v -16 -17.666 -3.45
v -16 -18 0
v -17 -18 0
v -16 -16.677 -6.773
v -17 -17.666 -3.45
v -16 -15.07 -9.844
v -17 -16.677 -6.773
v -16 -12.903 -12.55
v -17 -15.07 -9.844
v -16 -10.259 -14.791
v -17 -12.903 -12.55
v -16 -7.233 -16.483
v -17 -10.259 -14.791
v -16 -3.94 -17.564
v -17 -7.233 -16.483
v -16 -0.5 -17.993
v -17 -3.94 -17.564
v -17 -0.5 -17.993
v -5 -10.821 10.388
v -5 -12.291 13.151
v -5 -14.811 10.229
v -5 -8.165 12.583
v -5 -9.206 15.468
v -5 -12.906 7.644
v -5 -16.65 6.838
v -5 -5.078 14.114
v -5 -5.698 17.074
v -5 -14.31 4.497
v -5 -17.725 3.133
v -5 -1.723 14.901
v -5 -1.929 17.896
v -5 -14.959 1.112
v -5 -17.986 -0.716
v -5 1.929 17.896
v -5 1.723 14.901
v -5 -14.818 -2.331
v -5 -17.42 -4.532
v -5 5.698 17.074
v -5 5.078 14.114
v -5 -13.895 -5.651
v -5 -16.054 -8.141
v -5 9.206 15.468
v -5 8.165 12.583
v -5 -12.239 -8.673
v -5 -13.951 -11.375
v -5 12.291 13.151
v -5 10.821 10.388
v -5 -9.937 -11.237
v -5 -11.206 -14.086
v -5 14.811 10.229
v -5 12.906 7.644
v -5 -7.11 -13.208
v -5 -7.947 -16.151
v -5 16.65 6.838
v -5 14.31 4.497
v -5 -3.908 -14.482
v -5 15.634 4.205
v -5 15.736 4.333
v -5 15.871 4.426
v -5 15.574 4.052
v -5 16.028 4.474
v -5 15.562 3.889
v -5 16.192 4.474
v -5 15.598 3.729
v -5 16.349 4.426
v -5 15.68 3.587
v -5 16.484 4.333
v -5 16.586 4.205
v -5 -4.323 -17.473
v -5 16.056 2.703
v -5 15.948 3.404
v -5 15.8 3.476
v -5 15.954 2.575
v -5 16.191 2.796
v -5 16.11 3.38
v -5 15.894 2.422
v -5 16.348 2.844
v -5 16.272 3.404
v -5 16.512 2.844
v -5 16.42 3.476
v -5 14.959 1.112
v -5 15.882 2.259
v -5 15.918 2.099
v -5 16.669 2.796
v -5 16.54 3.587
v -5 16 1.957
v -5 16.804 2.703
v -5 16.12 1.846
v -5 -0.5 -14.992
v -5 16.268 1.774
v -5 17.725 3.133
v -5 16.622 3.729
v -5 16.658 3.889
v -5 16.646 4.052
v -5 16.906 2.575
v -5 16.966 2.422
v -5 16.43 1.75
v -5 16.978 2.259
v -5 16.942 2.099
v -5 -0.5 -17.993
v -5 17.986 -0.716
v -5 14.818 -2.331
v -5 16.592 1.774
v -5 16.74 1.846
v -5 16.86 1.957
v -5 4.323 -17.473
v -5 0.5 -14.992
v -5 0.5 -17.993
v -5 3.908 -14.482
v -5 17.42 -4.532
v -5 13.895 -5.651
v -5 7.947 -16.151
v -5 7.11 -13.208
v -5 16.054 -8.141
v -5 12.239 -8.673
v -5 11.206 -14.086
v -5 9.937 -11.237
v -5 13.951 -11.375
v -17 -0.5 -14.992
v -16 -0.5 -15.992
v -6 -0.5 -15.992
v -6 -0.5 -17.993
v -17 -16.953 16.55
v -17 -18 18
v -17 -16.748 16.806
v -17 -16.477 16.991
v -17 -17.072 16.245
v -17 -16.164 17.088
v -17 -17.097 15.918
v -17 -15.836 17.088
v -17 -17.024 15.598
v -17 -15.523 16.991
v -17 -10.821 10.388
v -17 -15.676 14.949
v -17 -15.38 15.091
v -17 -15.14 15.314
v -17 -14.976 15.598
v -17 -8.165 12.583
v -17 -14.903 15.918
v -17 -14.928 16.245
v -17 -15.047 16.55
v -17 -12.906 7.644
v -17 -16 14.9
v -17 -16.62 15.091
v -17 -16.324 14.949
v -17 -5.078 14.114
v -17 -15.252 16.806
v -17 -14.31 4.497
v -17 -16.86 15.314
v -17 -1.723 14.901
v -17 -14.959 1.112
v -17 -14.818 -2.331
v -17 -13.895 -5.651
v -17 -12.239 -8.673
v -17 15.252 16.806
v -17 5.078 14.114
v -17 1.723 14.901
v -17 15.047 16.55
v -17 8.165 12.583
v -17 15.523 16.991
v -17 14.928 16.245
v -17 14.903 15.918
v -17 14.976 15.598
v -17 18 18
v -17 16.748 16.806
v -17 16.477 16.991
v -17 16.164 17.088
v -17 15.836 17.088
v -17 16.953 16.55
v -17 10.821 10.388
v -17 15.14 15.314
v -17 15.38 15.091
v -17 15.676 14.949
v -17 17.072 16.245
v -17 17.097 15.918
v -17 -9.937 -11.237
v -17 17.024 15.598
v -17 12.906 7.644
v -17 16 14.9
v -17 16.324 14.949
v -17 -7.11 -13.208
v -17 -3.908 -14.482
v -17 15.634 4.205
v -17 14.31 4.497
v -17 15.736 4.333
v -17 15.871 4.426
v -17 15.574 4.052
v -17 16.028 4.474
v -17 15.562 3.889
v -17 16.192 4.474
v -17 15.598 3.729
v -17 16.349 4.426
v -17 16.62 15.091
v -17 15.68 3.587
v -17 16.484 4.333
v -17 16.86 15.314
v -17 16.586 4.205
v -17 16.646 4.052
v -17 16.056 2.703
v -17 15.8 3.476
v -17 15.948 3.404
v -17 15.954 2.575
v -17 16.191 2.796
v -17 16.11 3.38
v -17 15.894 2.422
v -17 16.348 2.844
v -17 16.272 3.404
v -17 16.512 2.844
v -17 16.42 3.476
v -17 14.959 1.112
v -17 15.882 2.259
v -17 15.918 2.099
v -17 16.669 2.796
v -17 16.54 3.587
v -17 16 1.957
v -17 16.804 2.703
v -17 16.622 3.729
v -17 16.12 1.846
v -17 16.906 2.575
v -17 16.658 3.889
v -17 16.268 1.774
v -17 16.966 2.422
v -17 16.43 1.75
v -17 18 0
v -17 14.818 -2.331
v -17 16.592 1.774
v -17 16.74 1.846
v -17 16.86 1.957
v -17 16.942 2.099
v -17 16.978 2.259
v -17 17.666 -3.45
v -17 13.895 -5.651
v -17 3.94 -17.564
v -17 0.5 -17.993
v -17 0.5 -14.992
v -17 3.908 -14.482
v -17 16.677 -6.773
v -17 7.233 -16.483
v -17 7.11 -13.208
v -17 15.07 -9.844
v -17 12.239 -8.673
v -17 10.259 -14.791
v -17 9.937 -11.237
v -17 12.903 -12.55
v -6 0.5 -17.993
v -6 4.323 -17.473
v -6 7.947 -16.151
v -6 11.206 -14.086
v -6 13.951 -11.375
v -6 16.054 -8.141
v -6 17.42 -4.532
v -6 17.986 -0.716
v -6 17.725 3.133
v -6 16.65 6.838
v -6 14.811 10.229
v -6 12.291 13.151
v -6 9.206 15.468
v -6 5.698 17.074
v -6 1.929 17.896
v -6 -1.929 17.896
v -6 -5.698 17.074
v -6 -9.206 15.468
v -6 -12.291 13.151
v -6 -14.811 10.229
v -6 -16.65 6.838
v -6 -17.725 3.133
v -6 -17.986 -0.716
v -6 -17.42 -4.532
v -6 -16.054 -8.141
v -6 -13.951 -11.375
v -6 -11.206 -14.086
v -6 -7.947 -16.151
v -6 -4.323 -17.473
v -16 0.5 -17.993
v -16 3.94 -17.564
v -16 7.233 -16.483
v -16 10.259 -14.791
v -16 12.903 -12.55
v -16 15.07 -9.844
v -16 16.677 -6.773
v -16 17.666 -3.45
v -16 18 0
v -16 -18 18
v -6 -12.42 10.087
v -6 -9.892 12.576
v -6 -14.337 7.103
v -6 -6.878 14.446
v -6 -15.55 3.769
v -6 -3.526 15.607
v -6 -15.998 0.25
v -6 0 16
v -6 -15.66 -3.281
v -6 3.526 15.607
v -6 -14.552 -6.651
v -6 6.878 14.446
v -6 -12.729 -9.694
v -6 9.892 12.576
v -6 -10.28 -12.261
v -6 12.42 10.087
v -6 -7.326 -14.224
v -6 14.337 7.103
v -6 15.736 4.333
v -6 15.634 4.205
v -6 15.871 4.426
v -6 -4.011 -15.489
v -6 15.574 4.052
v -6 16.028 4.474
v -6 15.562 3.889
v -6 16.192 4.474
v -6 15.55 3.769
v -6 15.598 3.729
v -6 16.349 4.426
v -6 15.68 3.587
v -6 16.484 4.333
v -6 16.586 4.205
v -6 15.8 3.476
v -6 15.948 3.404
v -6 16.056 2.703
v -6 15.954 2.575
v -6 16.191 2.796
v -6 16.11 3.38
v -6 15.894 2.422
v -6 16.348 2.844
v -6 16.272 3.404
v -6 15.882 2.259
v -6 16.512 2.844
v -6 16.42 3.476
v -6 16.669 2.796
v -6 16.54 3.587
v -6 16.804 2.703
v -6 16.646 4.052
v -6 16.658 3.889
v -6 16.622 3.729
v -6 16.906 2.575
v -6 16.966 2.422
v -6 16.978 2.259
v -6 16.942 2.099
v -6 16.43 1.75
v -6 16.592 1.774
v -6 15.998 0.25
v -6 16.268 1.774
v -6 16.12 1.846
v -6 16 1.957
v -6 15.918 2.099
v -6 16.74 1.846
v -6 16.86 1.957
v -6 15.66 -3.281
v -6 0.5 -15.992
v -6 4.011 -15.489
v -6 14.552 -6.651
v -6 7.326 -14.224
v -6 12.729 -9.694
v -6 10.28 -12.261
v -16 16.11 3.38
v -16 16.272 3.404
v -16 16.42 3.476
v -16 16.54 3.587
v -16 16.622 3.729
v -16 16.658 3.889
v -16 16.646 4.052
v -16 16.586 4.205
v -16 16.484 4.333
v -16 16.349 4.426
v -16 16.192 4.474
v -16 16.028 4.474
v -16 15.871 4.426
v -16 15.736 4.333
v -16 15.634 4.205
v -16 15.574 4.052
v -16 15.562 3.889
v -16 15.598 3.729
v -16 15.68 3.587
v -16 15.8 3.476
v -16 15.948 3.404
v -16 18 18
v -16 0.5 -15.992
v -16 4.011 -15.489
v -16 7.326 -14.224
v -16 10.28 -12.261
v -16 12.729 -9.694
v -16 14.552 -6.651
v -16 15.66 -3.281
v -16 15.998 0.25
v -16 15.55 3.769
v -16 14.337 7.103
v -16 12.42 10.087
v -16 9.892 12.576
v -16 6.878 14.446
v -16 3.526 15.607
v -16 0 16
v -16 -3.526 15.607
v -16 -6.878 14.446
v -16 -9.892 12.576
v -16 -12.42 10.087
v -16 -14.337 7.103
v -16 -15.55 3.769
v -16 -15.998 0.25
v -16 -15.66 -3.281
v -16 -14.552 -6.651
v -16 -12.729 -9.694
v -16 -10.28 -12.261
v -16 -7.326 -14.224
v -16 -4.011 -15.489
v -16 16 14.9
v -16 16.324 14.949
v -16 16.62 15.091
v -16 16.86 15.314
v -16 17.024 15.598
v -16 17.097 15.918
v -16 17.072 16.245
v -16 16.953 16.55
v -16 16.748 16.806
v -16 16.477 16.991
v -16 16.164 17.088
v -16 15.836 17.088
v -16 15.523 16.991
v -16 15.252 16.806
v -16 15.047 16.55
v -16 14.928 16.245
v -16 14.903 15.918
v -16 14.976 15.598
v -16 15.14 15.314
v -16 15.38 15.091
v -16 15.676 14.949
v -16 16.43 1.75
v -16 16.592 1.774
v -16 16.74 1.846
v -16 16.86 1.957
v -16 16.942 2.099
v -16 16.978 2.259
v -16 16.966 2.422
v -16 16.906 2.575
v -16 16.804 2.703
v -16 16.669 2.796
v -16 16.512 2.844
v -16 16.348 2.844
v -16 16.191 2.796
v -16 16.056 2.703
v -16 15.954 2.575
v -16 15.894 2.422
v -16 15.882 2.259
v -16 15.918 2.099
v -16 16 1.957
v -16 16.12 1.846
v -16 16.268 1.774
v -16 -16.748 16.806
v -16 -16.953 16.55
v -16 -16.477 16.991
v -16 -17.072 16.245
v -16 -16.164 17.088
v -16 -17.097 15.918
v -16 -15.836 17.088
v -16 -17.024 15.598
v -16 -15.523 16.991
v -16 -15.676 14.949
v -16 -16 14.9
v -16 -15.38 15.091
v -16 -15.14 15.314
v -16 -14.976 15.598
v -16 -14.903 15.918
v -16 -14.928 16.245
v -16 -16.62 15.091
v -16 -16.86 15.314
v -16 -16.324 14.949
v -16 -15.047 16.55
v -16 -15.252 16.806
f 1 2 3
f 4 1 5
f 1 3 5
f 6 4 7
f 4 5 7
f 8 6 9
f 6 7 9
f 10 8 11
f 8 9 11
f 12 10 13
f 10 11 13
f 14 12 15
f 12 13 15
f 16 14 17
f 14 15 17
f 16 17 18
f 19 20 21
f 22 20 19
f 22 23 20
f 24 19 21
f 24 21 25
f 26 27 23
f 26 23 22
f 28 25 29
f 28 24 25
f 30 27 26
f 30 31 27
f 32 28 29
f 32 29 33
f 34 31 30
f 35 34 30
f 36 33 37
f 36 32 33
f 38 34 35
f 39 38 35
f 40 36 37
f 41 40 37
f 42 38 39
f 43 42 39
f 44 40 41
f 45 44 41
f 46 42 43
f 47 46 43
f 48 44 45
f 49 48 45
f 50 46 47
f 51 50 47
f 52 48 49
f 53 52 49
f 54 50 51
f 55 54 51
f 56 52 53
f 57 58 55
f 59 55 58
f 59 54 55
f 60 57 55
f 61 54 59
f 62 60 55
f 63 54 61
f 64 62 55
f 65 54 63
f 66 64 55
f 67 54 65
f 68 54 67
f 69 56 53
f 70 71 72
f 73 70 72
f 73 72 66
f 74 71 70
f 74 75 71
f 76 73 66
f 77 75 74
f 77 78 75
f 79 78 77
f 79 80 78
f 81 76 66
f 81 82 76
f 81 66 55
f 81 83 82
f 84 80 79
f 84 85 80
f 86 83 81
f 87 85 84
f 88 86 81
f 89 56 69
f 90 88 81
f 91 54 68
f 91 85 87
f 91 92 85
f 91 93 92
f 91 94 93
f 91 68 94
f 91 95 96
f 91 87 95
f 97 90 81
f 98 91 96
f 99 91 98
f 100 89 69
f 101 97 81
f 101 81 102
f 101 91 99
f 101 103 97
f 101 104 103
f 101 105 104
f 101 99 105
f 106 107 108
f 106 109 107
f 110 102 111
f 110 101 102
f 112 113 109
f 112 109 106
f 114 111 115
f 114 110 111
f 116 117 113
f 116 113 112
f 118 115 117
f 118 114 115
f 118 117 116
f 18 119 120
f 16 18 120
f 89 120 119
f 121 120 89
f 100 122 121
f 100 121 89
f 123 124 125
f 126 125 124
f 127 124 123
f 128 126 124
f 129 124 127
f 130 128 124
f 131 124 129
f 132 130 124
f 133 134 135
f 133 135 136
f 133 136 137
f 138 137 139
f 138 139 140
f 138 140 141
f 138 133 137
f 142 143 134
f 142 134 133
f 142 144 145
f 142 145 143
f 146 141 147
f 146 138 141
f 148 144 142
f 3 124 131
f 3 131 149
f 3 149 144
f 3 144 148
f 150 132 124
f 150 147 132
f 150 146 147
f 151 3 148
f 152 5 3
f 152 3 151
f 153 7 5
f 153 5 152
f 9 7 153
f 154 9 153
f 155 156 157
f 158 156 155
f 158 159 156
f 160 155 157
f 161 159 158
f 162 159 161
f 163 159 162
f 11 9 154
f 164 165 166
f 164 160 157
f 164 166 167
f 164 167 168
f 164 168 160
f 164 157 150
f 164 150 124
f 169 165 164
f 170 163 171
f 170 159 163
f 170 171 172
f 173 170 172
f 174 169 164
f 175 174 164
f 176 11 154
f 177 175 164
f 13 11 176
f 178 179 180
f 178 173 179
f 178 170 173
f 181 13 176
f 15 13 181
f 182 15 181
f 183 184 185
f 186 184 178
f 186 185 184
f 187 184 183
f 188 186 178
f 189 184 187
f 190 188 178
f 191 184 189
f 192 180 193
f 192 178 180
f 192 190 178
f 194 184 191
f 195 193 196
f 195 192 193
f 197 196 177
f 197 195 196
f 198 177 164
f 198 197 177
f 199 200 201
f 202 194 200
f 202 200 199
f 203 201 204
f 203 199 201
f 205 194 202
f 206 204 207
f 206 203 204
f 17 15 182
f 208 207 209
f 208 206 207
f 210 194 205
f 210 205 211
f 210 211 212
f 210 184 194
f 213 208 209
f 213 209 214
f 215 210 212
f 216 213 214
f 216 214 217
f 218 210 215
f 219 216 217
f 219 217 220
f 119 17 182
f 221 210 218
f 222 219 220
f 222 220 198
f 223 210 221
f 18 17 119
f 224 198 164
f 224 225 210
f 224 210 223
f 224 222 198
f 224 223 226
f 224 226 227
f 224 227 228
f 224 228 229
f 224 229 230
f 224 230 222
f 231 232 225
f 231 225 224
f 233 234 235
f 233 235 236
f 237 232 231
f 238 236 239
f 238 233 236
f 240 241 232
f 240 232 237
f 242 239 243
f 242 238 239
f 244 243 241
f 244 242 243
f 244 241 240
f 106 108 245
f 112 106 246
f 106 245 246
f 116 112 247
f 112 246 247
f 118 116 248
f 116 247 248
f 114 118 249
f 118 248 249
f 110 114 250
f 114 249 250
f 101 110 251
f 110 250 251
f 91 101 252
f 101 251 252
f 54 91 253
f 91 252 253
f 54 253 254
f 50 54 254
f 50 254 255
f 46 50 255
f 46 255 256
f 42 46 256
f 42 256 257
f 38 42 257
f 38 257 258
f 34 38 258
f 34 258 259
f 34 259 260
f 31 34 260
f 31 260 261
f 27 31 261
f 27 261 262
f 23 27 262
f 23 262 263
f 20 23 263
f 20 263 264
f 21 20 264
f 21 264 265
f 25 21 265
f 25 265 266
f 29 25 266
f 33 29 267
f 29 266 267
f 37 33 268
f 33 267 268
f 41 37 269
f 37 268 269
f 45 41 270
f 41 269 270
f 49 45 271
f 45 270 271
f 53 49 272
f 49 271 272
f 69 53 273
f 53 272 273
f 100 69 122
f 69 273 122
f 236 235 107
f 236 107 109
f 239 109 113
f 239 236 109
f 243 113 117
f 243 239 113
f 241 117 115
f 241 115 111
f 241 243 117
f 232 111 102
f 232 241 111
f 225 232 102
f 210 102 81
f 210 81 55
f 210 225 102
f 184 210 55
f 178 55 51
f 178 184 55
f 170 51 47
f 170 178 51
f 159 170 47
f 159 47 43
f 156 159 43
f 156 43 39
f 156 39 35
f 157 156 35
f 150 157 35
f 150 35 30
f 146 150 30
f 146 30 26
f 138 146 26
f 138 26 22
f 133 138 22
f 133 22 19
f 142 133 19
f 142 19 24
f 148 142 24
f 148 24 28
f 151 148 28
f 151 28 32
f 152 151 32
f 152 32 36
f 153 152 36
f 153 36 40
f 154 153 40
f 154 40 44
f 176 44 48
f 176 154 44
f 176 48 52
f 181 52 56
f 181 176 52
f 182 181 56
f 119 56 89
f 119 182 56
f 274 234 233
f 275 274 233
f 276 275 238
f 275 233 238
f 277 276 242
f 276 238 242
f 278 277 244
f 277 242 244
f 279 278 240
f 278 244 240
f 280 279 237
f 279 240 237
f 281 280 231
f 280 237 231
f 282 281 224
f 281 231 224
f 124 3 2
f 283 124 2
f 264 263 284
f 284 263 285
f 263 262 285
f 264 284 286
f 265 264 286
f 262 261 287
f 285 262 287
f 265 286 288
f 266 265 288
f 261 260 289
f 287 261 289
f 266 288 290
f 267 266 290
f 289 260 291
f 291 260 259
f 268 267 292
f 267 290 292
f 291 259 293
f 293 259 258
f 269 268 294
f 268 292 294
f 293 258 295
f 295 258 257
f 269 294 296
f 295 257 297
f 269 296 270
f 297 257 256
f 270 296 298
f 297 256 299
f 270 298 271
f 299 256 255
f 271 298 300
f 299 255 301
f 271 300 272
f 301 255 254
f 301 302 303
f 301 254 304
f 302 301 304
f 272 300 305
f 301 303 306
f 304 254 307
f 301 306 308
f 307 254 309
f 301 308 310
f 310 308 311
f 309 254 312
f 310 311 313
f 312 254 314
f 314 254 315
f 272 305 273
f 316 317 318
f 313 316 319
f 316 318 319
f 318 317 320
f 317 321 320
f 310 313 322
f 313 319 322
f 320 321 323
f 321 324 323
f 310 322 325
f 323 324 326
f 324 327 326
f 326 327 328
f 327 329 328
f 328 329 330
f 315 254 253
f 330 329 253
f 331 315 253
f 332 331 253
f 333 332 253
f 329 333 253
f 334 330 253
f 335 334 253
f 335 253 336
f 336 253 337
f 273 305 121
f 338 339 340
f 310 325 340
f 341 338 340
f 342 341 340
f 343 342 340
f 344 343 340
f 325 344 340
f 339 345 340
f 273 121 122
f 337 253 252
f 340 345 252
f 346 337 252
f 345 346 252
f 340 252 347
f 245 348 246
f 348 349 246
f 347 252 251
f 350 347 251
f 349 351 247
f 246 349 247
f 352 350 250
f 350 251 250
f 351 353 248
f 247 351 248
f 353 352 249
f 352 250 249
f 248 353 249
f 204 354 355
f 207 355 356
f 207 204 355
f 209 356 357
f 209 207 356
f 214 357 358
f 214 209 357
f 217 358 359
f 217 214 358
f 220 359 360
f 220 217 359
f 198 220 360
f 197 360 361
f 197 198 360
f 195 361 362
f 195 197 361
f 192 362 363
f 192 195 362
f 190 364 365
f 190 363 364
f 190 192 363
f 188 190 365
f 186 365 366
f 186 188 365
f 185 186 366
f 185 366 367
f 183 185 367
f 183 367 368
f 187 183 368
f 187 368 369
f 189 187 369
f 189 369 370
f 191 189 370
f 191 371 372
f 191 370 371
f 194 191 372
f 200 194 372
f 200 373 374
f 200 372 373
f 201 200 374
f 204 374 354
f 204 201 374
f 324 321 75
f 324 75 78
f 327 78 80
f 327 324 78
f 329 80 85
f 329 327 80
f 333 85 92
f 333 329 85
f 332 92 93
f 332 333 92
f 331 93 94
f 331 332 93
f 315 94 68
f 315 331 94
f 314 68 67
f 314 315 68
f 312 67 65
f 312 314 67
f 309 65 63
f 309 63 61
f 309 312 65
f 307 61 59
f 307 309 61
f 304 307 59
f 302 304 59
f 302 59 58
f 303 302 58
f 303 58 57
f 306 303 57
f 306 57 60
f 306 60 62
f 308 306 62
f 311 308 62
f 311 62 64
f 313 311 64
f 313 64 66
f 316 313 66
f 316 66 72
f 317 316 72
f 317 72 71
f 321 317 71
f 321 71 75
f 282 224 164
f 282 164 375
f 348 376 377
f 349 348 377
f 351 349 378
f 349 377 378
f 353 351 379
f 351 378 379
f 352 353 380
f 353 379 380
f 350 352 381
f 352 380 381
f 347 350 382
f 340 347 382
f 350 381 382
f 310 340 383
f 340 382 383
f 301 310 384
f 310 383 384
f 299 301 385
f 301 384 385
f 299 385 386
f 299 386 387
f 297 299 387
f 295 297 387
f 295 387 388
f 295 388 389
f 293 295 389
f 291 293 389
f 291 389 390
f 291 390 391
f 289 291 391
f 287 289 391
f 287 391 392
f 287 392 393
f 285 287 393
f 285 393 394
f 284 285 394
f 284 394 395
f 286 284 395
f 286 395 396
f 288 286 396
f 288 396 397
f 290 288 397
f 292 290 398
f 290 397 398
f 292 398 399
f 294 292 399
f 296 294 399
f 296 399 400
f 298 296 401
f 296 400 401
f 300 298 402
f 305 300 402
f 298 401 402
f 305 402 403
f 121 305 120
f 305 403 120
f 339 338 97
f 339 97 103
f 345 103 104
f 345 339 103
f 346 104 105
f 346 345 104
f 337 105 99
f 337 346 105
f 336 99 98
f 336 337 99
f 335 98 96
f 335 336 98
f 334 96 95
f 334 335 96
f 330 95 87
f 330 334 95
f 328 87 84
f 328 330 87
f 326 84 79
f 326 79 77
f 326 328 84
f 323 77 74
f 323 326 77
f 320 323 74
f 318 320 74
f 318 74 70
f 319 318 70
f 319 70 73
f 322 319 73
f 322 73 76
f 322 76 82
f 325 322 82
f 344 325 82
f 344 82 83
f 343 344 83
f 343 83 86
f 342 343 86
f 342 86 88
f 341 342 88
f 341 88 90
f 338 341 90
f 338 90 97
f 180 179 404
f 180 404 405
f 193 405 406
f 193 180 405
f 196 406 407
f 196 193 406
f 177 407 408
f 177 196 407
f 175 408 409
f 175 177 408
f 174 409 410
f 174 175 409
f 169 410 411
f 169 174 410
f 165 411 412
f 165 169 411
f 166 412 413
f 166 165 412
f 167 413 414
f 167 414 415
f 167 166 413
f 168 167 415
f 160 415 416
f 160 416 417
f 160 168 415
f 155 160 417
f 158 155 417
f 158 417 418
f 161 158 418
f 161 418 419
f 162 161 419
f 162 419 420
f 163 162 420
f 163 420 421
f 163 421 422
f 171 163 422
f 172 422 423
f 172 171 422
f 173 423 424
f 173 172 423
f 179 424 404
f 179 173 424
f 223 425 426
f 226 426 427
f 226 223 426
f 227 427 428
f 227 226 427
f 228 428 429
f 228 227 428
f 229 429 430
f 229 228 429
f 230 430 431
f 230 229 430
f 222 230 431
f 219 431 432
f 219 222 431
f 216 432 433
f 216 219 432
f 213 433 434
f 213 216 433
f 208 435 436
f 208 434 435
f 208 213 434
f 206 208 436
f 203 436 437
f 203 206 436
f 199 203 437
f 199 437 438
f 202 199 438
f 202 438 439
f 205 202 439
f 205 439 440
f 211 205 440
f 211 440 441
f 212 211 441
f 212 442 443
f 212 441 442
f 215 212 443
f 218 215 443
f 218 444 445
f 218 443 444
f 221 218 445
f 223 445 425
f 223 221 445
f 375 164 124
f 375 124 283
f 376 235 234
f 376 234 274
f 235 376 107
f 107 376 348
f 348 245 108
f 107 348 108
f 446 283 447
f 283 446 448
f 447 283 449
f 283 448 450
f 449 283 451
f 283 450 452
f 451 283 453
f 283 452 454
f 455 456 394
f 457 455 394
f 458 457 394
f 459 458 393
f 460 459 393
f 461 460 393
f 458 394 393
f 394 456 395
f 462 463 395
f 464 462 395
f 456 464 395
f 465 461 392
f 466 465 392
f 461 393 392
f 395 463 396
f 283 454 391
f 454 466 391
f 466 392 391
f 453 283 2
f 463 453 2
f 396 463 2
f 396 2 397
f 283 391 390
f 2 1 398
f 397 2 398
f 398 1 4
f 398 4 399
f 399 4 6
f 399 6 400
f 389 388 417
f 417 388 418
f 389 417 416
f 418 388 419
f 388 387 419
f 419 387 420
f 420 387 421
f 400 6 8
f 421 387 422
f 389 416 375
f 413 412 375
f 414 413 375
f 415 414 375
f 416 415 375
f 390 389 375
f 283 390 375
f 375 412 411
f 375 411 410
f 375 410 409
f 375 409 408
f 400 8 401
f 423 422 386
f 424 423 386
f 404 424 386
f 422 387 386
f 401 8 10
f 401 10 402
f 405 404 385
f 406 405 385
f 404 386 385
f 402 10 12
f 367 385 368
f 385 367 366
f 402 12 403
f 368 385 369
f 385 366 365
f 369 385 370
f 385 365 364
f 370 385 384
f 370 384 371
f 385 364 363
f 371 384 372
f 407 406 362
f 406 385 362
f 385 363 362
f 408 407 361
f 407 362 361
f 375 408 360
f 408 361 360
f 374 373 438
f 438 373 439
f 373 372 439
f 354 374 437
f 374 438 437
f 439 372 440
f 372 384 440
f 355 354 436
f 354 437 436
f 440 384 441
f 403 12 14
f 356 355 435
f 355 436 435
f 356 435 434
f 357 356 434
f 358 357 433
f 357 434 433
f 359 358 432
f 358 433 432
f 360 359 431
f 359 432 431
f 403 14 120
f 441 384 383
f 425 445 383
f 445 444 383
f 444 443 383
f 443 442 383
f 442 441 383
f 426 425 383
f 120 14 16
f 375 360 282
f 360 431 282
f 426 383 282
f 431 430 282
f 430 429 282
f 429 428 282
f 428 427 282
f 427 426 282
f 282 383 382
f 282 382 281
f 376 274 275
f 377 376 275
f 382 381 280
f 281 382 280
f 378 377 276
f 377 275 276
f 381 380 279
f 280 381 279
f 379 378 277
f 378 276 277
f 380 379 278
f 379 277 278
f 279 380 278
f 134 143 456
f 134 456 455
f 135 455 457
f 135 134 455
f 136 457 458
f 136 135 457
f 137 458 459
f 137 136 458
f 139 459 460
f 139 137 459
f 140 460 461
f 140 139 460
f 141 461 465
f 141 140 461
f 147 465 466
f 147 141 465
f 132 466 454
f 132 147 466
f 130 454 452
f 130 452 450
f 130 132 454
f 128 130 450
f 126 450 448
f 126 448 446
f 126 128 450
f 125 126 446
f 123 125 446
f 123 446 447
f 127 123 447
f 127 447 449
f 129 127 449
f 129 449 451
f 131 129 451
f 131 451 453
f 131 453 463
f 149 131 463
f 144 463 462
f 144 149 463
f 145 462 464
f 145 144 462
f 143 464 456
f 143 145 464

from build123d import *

# Parameters (mm, degrees)
CYLINDER079_R     = 0.55
CYLINDER079_DEPTH = 12
CYLINDER078_R     = 0.55
CYLINDER078_DEPTH = 12
CYLINDER073_R     = 15
CYLINDER073_DEPTH = 12
CYLINDER072_R     = 1.1
CYLINDER072_DEPTH = 1
CYLINDER071_R     = 1.1
CYLINDER071_DEPTH = 1
BOX039_W          = 1
BOX039_H          = 36
BOX039_DEPTH      = 18
CYLINDER075_R     = 0.55
CYLINDER075_DEPTH = 12
CYLINDER074_R     = 0.55
CYLINDER074_DEPTH = 12
BOX038_W          = 12
BOX038_H          = 1
BOX038_DEPTH      = 5
CYLINDER069_R     = 16
CYLINDER069_DEPTH = 10
CYLINDER068_R     = 18
CYLINDER068_DEPTH = 10
CYLINDER067_R     = 15
CYLINDER067_DEPTH = 12
CYLINDER066_R     = 18
CYLINDER066_DEPTH = 12


with BuildPart() as zylinder076:
    # Cylinder079 → Cylinder079 (new body)
    with BuildSketch(Plane(origin=(-17, 16.11, 3.93), x_dir=(0, 0, -1), z_dir=(1, 0, 0))):
        Circle(CYLINDER079_R)
    extrude(amount=CYLINDER079_DEPTH)


with BuildPart() as fusion037:
    # Cylinder078 → Cylinder078 (new body)
    with BuildSketch(Plane(origin=(-17, 16.43, 2.3), x_dir=(0, 0, -1), z_dir=(1, 0, 0))):
        Circle(CYLINDER078_R)
    extrude(amount=CYLINDER078_DEPTH)

    # Fusion037: union Zylinder076
    add(zylinder076.part)


with BuildPart() as zylinder070:
    # Cylinder073 → Cylinder073 (new body)
    with BuildSketch(Plane(origin=(-17, 0, 0), x_dir=(0, 0, -1), z_dir=(1, 0, 0))):
        Circle(CYLINDER073_R)
    extrude(amount=CYLINDER073_DEPTH)


with BuildPart() as zylinder069:
    # Cylinder072 → Cylinder072 (new body)
    with BuildSketch(Plane(origin=(-17, 16, 16), x_dir=(0, 0, -1), z_dir=(1, 0, 0))):
        Circle(CYLINDER072_R)
    extrude(amount=CYLINDER072_DEPTH)


with BuildPart() as fusion034:
    # Cylinder071 → Cylinder071 (new body)
    with BuildSketch(Plane(origin=(-17, -16, 16), x_dir=(0, 0, -1), z_dir=(1, 0, 0))):
        Circle(CYLINDER071_R)
    extrude(amount=CYLINDER071_DEPTH)

    # Fusion034: union Zylinder069
    add(zylinder069.part)


with BuildPart() as cut059:
    # Box039 → Box039 (new body)
    with BuildSketch(Plane(origin=(-17, -18, 0), x_dir=(1, 0, 0), z_dir=(0, 0, 1))):
        with Locations((0.5, 18)):
            Rectangle(BOX039_W, BOX039_H)
    extrude(amount=BOX039_DEPTH)

    # Cut055: cut Fusion034
    add(fusion034.part, mode=Mode.SUBTRACT)

    # Cut056: cut Zylinder070
    add(zylinder070.part, mode=Mode.SUBTRACT)

    # Cut059: cut Fusion037
    add(fusion037.part, mode=Mode.SUBTRACT)


with BuildPart() as zylinder072:
    # Cylinder075 → Cylinder075 (new body)
    with BuildSketch(Plane(origin=(-17, 16.11, 3.93), x_dir=(0, 0, -1), z_dir=(1, 0, 0))):
        Circle(CYLINDER075_R)
    extrude(amount=CYLINDER075_DEPTH)


with BuildPart() as fusion035:
    # Cylinder074 → Cylinder074 (new body)
    with BuildSketch(Plane(origin=(-17, 16.43, 2.3), x_dir=(0, 0, -1), z_dir=(1, 0, 0))):
        Circle(CYLINDER074_R)
    extrude(amount=CYLINDER074_DEPTH)

    # Fusion035: union Zylinder072
    add(zylinder072.part)


with BuildPart() as w_rfel037:
    # Box038 → Box038 (new body)
    with BuildSketch(Plane(origin=(-17, -0.5, -19), x_dir=(1, 0, 0), z_dir=(0, 0, 1))):
        with Locations((6, 0.5)):
            Rectangle(BOX038_W, BOX038_H)
    extrude(amount=BOX038_DEPTH)


with BuildPart() as zylinder066:
    # Cylinder069 → Cylinder069 (new body)
    with BuildSketch(Plane(origin=(0, 0, 0), x_dir=(0, 0, -1), z_dir=(1, 0, 0))):
        Circle(CYLINDER069_R)
    extrude(amount=CYLINDER069_DEPTH)


with BuildPart() as cut050:
    # Cylinder068 → Cylinder068 (new body)
    with BuildSketch(Plane(origin=(0, 0, 0), x_dir=(0, 0, -1), z_dir=(1, 0, 0))):
        Circle(CYLINDER068_R)
    extrude(amount=CYLINDER068_DEPTH)

    # Cut050: cut Zylinder066
    add(zylinder066.part, mode=Mode.SUBTRACT)


with BuildPart() as cut050_1:
    # Cut050 placement: moved
    add(cut050.part.moved(Location((-16, 0, 0))))


with BuildPart() as zylinder064:
    # Cylinder067 → Cylinder067 (new body)
    with BuildSketch(Plane(origin=(0, 0, 0), x_dir=(0, 0, -1), z_dir=(1, 0, 0))):
        Circle(CYLINDER067_R)
    extrude(amount=CYLINDER067_DEPTH)


with BuildPart() as fusion038:
    # Cylinder066 → Cylinder066 (new body)
    with BuildSketch(Plane(origin=(0, 0, 0), x_dir=(0, 0, -1), z_dir=(1, 0, 0))):
        Circle(CYLINDER066_R)
    extrude(amount=CYLINDER066_DEPTH)

    # Cut049: cut Zylinder064
    add(zylinder064.part, mode=Mode.SUBTRACT)


with BuildPart() as fusion038_1:
    # Cut049 placement: moved
    add(fusion038.part.moved(Location((-17, 0, 0))))

    # Cut051: cut Cut050
    add(cut050_1.part, mode=Mode.SUBTRACT)

    # Cut054: cut Würfel037
    add(w_rfel037.part, mode=Mode.SUBTRACT)

    # Cut057: cut Fusion035
    add(fusion035.part, mode=Mode.SUBTRACT)

    # Fusion038: union Cut059
    add(cut059.part)


solid = fusion038_1.part
